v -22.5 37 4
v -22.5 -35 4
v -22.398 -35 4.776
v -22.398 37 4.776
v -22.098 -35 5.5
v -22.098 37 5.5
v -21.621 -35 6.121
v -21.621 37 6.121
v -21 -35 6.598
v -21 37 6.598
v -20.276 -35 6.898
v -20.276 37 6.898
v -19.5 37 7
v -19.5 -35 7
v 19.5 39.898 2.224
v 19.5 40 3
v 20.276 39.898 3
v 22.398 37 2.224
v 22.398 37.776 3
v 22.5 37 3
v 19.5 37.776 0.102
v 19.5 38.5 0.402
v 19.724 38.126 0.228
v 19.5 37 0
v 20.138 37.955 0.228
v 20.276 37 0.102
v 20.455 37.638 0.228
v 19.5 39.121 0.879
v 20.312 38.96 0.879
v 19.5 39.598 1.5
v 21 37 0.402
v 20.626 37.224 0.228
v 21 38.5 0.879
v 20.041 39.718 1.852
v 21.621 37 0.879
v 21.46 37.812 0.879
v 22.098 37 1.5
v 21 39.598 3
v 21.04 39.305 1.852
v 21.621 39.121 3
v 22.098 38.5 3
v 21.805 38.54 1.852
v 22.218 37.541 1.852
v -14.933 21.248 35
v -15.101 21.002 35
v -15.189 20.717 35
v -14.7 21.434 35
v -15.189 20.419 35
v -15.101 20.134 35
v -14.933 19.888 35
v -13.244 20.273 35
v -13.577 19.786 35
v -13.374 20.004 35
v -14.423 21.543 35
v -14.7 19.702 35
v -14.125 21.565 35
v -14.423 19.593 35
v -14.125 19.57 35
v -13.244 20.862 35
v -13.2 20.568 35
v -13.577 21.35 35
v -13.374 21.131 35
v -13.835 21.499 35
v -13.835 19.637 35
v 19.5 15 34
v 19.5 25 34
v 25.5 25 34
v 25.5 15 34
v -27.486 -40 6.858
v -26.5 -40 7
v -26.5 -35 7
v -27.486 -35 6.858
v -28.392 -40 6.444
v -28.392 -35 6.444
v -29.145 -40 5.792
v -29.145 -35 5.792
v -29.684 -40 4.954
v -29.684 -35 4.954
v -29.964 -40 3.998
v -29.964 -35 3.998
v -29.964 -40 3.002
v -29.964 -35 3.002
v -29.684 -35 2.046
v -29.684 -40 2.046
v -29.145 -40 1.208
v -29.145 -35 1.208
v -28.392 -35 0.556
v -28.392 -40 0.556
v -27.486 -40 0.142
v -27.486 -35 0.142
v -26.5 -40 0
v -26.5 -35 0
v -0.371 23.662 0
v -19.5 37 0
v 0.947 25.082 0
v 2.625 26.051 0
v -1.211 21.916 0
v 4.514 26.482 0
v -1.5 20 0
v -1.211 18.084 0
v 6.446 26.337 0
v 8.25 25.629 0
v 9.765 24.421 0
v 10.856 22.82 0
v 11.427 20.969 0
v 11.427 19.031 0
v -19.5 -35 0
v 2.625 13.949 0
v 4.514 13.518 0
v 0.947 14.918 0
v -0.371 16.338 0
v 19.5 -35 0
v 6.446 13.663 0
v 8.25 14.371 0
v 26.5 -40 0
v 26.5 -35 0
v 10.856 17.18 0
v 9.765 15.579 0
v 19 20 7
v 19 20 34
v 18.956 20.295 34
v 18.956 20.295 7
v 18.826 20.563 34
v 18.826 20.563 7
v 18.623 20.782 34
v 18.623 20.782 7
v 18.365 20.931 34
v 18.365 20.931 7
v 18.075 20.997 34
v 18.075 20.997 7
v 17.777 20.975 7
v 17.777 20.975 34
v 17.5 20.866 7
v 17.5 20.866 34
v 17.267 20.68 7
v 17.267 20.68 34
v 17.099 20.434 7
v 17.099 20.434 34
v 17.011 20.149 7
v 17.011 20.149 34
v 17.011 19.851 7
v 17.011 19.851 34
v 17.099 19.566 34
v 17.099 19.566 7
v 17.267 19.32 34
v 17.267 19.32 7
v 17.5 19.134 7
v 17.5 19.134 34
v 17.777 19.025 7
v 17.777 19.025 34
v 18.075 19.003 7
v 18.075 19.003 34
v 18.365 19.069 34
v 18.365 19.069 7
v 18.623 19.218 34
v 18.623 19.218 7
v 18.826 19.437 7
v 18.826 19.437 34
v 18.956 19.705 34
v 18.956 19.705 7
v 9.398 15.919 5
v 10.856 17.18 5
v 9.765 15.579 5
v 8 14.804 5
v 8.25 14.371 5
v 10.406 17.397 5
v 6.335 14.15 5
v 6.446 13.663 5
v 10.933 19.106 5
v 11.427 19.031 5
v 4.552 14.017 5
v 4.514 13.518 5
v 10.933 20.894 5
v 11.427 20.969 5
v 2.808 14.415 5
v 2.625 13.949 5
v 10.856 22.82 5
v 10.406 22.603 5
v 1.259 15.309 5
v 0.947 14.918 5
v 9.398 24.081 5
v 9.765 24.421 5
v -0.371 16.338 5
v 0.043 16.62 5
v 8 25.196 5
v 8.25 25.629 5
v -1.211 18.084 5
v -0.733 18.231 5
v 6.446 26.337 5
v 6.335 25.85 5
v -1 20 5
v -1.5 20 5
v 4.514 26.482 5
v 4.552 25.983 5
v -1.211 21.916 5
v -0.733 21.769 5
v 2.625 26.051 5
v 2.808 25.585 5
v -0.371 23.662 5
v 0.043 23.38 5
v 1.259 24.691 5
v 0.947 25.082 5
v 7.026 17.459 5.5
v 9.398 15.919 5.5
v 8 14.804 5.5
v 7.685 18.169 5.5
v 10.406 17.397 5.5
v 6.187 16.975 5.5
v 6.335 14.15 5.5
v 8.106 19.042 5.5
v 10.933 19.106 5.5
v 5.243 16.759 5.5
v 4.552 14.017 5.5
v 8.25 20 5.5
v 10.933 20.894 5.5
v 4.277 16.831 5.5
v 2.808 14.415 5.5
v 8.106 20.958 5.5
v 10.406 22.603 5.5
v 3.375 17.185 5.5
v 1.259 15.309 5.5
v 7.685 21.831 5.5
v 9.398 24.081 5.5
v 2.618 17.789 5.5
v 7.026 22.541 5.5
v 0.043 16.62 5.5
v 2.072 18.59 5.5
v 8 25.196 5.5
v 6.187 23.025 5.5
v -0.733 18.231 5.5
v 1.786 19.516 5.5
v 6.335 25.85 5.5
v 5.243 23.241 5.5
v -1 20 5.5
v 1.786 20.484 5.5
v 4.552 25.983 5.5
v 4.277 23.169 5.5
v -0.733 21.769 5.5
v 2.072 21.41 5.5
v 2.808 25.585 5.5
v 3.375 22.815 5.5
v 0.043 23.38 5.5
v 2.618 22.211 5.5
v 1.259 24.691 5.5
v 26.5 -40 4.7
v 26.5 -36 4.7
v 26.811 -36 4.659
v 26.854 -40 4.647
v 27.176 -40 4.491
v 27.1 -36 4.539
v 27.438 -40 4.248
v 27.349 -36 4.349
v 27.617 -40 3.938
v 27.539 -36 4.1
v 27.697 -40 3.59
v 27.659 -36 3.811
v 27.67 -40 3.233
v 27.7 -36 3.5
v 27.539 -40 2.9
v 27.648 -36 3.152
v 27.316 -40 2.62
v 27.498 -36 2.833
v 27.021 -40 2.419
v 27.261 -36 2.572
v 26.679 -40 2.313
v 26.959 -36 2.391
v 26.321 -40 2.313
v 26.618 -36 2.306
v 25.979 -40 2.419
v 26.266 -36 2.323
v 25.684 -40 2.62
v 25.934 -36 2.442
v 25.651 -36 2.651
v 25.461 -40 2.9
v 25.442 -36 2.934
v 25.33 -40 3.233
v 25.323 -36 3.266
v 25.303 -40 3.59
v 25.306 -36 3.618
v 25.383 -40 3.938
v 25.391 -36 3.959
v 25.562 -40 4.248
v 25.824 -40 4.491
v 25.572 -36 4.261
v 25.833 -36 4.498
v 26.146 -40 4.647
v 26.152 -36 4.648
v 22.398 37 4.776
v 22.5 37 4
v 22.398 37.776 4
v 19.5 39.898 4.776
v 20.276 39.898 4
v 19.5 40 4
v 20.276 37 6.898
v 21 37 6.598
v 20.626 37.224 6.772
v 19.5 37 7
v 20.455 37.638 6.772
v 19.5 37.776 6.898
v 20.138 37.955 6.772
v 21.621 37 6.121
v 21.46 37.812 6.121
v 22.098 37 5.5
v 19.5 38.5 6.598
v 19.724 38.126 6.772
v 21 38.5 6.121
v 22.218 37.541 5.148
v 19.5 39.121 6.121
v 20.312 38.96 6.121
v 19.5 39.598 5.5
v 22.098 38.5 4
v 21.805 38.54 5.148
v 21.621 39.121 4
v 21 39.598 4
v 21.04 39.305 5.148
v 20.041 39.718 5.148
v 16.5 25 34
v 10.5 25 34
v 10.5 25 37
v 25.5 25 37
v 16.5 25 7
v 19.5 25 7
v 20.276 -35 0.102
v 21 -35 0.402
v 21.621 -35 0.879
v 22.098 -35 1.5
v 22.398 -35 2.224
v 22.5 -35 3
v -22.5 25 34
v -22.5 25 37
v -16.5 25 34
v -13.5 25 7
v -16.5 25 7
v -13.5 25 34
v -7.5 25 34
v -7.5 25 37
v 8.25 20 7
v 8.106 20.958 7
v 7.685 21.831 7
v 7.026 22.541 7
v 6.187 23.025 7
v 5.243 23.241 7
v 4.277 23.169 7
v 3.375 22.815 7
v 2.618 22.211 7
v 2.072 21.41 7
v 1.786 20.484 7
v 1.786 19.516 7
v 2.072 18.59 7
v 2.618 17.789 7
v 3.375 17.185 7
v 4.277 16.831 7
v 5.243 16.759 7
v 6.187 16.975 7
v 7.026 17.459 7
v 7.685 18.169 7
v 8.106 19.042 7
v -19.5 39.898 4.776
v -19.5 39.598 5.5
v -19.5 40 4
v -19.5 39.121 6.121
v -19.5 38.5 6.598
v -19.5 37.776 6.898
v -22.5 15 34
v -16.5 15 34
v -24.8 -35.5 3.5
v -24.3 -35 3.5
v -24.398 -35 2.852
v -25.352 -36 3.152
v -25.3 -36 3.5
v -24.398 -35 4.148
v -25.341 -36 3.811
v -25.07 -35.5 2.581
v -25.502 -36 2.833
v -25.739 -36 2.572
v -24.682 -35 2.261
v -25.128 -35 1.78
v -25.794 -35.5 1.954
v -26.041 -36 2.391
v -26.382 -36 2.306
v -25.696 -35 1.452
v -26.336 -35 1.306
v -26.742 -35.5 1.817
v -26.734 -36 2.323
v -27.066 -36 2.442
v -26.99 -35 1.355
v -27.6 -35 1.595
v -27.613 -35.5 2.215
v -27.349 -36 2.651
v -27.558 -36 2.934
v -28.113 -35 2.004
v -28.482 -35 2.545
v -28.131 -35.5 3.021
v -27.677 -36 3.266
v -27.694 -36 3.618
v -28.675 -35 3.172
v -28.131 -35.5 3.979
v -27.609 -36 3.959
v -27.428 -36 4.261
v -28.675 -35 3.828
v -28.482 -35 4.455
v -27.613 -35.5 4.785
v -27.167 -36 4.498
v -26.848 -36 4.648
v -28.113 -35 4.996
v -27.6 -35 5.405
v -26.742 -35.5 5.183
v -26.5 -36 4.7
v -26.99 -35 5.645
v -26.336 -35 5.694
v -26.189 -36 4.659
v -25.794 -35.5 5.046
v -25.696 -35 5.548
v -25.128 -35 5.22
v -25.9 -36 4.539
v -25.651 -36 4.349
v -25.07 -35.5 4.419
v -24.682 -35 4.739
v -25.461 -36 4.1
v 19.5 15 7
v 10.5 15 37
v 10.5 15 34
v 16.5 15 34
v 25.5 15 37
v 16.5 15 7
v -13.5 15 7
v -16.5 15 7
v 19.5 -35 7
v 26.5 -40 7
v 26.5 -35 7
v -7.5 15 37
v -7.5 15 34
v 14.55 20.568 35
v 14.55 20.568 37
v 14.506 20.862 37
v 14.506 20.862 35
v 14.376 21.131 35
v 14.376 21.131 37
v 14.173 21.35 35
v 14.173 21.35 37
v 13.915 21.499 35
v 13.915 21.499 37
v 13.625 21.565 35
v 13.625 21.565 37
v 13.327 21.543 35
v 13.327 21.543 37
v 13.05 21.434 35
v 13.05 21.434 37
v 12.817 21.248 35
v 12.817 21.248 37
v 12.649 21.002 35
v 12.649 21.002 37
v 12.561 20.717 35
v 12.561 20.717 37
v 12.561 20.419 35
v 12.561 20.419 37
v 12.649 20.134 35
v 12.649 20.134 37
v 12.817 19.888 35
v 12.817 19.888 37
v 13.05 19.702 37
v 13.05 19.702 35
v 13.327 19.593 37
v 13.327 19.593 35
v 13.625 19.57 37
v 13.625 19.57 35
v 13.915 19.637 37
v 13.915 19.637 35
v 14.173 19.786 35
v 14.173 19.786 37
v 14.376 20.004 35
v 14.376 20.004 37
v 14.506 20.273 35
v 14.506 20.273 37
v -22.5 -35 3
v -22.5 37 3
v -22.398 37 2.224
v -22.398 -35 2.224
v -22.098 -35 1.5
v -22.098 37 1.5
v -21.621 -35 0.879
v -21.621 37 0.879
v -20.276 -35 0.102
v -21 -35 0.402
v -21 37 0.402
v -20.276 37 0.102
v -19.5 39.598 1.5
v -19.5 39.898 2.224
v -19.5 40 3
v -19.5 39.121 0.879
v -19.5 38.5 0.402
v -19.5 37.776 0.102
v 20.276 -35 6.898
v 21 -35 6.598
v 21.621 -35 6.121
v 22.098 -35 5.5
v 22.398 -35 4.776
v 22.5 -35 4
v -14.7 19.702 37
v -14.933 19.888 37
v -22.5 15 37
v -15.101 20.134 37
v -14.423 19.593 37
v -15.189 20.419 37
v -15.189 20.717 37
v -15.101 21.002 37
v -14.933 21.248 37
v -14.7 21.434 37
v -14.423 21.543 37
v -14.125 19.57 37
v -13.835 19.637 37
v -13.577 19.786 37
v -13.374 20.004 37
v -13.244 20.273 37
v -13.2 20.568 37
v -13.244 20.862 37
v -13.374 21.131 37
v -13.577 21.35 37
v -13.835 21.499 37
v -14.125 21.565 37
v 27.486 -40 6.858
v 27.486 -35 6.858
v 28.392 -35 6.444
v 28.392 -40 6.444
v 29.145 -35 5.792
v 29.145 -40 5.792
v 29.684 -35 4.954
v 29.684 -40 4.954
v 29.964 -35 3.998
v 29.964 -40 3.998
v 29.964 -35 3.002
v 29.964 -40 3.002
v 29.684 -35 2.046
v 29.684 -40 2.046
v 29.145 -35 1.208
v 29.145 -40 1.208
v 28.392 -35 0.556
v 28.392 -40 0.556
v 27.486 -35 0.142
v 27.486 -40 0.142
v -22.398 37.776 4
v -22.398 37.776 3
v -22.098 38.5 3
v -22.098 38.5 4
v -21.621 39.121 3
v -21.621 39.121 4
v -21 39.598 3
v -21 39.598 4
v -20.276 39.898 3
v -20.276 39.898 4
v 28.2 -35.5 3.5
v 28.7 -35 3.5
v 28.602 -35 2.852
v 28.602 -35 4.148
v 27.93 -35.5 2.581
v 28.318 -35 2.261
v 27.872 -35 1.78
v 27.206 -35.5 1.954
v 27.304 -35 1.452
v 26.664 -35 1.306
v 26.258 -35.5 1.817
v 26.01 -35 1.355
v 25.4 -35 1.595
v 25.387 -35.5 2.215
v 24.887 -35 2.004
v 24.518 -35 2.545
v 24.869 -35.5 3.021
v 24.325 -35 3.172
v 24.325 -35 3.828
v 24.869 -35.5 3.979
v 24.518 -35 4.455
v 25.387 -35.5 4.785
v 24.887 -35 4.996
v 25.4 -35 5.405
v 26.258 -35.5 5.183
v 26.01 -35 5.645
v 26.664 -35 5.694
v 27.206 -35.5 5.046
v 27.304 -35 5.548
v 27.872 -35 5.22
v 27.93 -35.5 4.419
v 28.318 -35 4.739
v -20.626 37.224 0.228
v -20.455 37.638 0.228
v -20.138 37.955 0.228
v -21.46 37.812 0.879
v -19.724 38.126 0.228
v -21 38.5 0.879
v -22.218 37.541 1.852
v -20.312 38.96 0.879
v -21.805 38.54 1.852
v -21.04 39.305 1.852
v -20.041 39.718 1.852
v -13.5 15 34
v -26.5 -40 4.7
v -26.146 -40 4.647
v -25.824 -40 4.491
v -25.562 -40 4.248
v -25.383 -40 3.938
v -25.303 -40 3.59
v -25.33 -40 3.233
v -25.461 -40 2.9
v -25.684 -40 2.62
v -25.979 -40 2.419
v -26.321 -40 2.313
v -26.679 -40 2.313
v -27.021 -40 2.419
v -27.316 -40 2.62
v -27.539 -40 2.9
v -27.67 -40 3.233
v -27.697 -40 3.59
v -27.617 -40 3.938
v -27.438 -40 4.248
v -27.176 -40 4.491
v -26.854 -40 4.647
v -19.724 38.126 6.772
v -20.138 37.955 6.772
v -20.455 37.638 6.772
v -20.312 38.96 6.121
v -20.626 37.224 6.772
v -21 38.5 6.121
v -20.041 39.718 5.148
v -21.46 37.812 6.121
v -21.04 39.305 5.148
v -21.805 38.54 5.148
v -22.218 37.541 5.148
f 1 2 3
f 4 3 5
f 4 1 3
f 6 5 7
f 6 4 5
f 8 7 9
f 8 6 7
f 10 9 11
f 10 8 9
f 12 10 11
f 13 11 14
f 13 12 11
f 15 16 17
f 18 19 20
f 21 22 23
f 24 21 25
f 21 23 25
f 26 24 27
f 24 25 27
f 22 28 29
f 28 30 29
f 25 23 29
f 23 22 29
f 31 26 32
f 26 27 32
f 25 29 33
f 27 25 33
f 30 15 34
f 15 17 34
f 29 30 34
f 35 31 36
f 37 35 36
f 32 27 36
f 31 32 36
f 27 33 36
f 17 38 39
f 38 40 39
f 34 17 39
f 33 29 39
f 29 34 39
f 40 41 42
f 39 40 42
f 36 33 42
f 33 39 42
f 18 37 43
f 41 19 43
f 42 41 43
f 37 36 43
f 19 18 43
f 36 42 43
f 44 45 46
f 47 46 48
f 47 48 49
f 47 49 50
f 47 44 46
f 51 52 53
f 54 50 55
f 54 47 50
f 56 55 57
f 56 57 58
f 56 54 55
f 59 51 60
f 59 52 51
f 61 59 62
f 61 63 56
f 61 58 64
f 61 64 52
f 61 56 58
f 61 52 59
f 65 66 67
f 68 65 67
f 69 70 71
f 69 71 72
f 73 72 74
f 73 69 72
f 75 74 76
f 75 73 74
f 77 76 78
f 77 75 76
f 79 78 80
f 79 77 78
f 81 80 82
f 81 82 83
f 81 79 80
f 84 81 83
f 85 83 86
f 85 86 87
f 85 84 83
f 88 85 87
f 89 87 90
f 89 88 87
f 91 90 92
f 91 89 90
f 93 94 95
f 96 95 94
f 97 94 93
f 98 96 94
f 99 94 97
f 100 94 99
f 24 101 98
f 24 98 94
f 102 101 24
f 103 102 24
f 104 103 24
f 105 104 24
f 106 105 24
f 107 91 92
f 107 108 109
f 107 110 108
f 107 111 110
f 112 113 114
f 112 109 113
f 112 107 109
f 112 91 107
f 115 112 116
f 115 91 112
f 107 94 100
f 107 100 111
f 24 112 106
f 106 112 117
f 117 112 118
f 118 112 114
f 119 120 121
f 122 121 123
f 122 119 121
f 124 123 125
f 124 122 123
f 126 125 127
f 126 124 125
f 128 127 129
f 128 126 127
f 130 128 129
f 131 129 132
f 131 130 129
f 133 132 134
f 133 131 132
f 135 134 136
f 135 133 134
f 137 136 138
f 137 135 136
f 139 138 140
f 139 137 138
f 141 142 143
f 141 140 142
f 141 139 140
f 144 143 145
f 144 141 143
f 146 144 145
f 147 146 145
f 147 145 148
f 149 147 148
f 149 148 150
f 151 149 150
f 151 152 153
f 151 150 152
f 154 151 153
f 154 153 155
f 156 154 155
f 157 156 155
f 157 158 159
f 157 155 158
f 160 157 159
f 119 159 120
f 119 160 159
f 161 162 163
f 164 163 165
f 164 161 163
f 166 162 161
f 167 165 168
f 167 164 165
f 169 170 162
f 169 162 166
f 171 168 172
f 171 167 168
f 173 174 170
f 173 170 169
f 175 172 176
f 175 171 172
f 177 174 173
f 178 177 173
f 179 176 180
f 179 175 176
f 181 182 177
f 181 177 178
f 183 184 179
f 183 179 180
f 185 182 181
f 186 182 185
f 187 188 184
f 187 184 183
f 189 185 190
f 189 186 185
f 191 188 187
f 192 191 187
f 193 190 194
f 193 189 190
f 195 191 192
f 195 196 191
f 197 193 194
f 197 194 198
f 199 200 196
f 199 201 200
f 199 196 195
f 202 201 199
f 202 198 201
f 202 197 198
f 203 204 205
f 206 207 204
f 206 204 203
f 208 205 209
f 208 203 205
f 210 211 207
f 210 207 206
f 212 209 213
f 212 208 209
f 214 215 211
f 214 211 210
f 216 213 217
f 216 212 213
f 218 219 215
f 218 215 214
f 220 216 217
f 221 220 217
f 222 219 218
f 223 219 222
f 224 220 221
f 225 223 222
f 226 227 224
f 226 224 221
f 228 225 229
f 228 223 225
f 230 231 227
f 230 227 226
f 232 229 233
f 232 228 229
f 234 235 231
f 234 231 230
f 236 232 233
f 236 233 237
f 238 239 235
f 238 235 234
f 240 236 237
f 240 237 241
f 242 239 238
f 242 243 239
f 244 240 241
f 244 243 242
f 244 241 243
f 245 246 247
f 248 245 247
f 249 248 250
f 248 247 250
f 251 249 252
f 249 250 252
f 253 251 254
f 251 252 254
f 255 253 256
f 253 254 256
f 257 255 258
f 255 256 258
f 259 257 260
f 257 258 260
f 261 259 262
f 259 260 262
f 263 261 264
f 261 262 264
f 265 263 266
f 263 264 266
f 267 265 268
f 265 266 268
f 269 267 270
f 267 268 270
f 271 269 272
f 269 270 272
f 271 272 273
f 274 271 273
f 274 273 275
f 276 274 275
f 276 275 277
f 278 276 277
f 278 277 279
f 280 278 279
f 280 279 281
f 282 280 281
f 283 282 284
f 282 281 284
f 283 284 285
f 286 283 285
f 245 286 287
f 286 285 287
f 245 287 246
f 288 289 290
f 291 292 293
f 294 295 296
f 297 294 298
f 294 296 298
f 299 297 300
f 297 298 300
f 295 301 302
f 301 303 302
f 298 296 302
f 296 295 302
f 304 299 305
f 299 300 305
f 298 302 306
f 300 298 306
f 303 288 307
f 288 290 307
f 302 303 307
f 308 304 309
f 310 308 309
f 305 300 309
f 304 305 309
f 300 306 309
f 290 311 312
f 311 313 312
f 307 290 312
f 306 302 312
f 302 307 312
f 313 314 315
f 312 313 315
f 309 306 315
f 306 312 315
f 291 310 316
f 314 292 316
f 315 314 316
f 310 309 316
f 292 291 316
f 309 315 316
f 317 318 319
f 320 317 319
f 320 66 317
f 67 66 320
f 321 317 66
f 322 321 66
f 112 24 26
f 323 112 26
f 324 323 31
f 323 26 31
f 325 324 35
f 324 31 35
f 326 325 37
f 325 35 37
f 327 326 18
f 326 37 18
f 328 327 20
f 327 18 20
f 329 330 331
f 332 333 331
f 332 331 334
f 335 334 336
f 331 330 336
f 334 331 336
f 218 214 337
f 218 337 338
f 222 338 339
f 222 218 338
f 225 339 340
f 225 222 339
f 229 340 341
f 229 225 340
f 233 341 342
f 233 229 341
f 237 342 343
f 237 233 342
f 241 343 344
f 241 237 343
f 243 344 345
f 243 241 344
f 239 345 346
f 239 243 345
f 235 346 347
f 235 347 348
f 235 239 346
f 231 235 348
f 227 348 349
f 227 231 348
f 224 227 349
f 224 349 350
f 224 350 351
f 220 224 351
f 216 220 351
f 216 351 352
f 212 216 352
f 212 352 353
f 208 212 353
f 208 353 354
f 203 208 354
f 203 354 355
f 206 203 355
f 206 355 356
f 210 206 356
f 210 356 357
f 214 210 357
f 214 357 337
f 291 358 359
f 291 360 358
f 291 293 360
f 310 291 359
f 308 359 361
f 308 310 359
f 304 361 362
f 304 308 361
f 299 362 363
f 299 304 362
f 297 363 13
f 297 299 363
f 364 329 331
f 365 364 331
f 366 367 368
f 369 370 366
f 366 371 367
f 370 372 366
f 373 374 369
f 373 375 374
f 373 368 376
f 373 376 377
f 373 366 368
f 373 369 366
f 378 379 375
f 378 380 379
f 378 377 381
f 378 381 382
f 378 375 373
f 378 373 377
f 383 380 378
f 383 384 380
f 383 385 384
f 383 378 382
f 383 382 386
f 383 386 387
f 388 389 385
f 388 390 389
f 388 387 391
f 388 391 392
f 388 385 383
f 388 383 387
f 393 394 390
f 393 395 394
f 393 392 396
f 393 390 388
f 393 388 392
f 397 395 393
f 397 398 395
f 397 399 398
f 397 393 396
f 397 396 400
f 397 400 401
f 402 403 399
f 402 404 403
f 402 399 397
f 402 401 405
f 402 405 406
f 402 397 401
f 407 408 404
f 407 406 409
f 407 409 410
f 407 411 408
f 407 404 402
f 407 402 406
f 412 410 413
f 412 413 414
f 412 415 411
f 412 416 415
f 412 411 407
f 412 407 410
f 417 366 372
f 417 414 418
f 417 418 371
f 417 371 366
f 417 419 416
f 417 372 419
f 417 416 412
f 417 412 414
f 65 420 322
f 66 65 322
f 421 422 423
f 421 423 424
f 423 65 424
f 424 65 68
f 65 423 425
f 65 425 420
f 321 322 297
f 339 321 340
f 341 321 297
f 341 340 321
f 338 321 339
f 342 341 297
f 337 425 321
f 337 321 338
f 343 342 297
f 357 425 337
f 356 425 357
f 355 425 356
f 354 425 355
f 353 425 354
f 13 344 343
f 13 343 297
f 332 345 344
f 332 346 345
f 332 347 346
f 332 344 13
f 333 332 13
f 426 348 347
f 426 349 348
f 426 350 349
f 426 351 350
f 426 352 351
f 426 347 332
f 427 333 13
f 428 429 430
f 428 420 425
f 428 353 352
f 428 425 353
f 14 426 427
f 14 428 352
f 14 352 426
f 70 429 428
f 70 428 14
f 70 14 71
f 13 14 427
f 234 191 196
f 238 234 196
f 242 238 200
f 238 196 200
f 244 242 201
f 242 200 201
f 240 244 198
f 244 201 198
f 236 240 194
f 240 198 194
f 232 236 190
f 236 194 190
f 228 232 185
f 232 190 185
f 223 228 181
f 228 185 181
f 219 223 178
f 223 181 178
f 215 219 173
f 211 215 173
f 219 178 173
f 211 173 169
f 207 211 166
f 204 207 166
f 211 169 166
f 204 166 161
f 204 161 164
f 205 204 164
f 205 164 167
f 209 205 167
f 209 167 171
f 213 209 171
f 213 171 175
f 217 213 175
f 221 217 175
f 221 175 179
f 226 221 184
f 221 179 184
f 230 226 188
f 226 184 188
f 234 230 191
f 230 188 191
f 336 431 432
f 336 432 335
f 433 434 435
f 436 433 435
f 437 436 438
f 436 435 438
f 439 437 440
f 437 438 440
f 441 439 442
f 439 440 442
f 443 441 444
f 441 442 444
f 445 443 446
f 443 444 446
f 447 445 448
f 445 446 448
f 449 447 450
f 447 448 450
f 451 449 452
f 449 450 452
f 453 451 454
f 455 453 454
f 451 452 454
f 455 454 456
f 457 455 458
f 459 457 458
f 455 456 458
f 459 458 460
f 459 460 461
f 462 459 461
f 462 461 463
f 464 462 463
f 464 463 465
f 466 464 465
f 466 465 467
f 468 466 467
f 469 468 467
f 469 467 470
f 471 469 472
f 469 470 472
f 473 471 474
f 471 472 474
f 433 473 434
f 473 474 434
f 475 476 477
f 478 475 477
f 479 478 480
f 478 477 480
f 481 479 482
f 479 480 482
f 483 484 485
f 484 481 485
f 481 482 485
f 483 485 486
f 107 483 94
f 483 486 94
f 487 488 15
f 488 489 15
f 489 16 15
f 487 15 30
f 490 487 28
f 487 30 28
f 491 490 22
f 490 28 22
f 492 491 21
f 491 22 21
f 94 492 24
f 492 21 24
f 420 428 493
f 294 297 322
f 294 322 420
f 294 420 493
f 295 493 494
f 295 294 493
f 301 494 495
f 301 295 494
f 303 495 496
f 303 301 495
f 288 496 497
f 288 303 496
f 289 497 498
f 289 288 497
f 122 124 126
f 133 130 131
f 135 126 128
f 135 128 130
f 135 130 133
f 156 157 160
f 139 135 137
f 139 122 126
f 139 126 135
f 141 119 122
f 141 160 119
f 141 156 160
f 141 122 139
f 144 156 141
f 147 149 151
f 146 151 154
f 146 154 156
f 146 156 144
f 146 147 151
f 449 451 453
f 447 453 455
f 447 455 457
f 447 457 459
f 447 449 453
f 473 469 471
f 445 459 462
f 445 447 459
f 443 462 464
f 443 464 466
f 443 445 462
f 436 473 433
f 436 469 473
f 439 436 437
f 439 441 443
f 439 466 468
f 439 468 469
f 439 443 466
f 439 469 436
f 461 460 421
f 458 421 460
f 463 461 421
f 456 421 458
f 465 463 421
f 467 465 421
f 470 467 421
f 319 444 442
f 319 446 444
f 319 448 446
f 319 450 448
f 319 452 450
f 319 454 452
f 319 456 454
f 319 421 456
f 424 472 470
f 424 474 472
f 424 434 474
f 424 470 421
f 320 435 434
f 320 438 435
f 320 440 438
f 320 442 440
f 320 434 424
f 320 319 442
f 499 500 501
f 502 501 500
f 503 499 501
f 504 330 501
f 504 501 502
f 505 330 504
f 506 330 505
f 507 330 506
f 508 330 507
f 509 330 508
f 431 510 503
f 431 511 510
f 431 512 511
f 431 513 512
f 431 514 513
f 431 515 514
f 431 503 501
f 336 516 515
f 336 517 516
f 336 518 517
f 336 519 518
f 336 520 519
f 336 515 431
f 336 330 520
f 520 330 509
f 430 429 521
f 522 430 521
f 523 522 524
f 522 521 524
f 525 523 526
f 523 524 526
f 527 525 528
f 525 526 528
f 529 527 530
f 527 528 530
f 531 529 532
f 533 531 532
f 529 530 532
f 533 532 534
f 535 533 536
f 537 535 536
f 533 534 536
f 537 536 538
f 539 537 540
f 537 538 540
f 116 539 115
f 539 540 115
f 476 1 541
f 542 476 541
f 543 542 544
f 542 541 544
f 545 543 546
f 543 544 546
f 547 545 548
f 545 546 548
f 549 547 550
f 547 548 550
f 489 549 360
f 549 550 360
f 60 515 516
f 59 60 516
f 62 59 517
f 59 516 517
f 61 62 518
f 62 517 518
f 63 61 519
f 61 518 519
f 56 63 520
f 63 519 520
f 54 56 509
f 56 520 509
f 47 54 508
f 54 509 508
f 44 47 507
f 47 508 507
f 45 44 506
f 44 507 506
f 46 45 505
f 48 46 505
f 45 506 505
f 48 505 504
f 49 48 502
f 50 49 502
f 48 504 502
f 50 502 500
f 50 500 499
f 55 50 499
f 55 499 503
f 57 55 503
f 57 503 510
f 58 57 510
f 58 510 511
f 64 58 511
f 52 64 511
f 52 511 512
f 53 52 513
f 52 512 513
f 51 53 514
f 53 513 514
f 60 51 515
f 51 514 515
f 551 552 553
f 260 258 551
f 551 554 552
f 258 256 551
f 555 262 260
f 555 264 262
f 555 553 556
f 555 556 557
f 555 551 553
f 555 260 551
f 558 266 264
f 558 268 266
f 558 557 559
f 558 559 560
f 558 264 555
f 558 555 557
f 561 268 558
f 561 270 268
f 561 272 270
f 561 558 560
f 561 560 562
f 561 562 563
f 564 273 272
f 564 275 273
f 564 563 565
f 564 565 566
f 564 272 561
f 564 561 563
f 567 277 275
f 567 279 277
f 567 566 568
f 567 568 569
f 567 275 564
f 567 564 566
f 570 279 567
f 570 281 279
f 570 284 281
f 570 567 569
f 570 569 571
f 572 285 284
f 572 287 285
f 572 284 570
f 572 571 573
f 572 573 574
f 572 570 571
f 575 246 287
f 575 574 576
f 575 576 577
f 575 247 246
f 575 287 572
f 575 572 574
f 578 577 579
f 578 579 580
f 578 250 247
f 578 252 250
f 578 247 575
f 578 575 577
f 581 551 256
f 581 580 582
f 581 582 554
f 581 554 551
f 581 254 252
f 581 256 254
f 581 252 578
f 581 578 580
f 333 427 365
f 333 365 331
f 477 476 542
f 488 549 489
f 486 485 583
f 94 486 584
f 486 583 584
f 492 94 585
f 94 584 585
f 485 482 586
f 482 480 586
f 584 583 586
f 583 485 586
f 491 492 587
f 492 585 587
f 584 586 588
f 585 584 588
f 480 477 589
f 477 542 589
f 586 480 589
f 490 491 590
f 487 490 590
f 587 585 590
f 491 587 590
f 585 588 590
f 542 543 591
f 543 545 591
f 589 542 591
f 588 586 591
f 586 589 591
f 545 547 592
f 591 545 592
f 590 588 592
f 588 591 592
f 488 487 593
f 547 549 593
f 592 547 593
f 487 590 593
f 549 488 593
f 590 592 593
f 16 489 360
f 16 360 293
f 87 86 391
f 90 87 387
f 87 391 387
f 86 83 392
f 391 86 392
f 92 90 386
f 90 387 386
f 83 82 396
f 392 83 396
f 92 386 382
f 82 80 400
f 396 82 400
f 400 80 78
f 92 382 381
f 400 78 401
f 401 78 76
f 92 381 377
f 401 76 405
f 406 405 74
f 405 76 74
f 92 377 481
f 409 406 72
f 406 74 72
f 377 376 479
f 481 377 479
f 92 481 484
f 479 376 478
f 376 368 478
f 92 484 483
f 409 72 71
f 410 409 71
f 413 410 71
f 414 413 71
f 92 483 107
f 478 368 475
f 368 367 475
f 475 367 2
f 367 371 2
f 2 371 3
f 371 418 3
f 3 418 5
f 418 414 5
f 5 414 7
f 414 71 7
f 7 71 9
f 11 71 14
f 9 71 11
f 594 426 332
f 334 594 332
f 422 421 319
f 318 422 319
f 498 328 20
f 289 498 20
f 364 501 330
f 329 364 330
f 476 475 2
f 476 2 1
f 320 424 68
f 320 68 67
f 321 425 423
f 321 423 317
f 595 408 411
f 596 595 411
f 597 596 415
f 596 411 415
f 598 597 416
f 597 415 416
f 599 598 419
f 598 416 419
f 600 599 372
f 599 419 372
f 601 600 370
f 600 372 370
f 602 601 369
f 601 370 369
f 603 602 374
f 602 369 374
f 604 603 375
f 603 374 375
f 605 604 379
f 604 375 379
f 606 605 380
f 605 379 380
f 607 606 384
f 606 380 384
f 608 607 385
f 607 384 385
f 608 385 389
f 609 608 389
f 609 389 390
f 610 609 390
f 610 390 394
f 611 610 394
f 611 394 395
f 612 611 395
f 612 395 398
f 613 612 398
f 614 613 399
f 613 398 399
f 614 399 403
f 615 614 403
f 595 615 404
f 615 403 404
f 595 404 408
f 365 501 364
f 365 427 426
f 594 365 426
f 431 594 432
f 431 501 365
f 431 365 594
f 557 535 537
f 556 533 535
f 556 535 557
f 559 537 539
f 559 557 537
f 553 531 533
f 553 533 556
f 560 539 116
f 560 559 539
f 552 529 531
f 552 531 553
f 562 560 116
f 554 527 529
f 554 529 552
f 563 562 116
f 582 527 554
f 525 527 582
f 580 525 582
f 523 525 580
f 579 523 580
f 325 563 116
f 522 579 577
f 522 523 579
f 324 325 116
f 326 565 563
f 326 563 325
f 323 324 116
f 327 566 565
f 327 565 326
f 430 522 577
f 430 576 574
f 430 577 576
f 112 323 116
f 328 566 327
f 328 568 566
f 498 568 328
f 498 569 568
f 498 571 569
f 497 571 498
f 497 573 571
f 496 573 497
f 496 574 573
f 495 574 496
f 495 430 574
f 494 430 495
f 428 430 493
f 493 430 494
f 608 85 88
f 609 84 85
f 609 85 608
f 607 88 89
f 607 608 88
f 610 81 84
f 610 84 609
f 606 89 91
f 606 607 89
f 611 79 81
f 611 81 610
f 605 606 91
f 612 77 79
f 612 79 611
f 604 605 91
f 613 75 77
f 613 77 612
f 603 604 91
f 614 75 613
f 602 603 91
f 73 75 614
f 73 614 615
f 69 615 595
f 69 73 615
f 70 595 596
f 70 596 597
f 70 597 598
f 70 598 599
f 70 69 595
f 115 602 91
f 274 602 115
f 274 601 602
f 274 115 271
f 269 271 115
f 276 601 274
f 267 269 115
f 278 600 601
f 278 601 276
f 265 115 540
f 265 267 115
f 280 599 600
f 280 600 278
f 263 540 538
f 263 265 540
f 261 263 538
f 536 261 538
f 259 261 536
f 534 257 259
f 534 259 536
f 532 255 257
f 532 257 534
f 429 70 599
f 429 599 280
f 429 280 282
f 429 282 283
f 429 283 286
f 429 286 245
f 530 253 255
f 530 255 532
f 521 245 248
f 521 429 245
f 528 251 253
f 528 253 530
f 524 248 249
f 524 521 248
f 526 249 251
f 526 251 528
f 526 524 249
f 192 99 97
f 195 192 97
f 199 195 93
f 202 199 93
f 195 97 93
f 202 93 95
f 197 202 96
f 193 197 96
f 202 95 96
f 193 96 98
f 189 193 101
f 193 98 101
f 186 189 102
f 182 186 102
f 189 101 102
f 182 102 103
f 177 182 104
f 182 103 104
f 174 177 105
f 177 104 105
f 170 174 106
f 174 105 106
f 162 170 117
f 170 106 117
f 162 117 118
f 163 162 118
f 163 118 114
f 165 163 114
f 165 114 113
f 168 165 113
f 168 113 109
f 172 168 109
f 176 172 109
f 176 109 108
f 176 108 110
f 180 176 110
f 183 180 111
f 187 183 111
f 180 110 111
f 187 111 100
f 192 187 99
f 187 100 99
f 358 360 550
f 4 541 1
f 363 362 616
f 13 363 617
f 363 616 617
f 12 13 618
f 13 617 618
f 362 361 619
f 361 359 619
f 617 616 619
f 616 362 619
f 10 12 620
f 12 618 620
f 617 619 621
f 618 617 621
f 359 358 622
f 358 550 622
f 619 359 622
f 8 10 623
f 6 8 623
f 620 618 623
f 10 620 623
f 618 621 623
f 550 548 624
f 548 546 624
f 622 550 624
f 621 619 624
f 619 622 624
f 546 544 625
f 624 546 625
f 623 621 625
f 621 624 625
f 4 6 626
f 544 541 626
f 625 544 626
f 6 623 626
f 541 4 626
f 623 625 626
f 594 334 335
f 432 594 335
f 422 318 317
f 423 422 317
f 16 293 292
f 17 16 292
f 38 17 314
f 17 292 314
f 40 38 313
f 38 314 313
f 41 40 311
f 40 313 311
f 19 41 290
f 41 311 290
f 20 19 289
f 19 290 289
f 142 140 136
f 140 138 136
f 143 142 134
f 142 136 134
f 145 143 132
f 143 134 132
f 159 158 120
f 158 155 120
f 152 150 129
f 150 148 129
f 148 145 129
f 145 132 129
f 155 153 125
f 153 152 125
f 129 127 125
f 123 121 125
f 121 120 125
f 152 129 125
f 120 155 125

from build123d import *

# Parameters (mm, degrees)
CROQUIS1_W                   = 45
CROQUIS1_H                   = 80
CROQUIS1_R                   = 3.25
SALIENTE_EXTRUIR1_DEPTH      = 7
CROQUIS2_R                   = 6.5
CORTAR_EXTRUIR1_DEPTH        = 5
CROQUIS3_R                   = 6
CORTAR_EXTRUIR2_DEPTH        = 0.5
REDONDEO2_R                  = 3
SALIENTE_EXTRUIR2_DEPTH      = 5
TALADROAVANZADO1_OUTLINE_R   = 1.2
TALADROAVANZADO1_DEPTH       = 1
TALADROAVANZADO1_DRAFT       = -45
TALADROAVANZADO1_2_OUTLINE_R = 1.2
TALADROAVANZADO1_2_DEPTH     = 1
TALADROAVANZADO1_2_DRAFT     = -45
CROQUIS8_R                   = 1.2
CORTAR_EXTRUIR3_DEPTH        = 83.006097334
CROQUIS9_W                   = 3
CROQUIS9_H                   = 10
CROQUIS9_R                   = 1
SALIENTE_EXTRUIR3_DEPTH      = 30
CROQUIS10_W                  = 15
CROQUIS10_H                  = 10
SALIENTE_EXTRUIR4_DEPTH      = 3
CROQUIS11_R                  = 1
CORTAR_EXTRUIR5_DEPTH        = 2


# Read off the part's stored shape, not the designer's step: TaladroAvanzado1
with BuildPart() as part:
    # Croquis1 → Saliente-Extruir1 (new body)
    with BuildSketch(Plane.XY):
        Rectangle(CROQUIS1_W, CROQUIS1_H)
        with Locations((5, 20)):
            Circle(CROQUIS1_R, mode=Mode.SUBTRACT)
    extrude(amount=SALIENTE_EXTRUIR1_DEPTH)

    # Croquis2 → Cortar-Extruir1 (cut)
    with BuildSketch(Plane(origin=(0, 0, 0), x_dir=(-1, 0, 0), z_dir=(0, 0, -1))):
        with Locations((-5, 20)):
            Circle(CROQUIS2_R)
    extrude(amount=-CORTAR_EXTRUIR1_DEPTH, mode=Mode.SUBTRACT)

    # Croquis3 → Cortar-Extruir2 (cut)
    with BuildSketch(Plane(origin=(0, 0, 5), x_dir=(-1, 0, 0), z_dir=(0, 0, -1))):
        with Locations((-5, 20)):
            Circle(CROQUIS3_R)
    extrude(amount=-CORTAR_EXTRUIR2_DEPTH, mode=Mode.SUBTRACT)

    # Redondeo2
    redondeo2_edges = [part.edges().sort_by_distance(p)[0] for p in [
        (-22.5, 40, 3.5),
        (22.5, 40, 3.5),
        (22.5, 0, 7),
        (0, 40, 7),
        (-22.5, 0, 7),
        (-22.5, 0, 0),
        (0, 40, 0),
        (22.5, 0, 0),
    ]]
    fillet(redondeo2_edges, radius=REDONDEO2_R)

    # Croquis4 → Saliente-Extruir2 (add)
    with BuildSketch(Plane.XZ.offset(40)):
        with BuildLine():
            Line((-19.5, 7), (-26.5, 7))
            ThreePointArc((-26.5, 7), (-30, 3.5), (-26.5, 0))
            Line((-26.5, 0), (-19.5, 0))
            Line((-19.5, 0), (-19.5, 7))
        make_face()
        with BuildLine():
            Line((19.5, 7), (26.5, 7))
            ThreePointArc((26.5, 7), (30, 3.5), (26.5, 0))
            Line((26.5, 0), (19.5, 0))
            Line((19.5, 0), (19.5, 7))
        make_face()
    extrude(amount=-SALIENTE_EXTRUIR2_DEPTH)


with BuildPart() as taladroavanzado1_tool:
    # TaladroAvanzado1 outline → TaladroAvanzado1 (with draft: the straight prism first)
    with BuildSketch(Plane(origin=(0, -36, 0), x_dir=(1, 0, 0), z_dir=(0, 1, 0))):
        with Locations((26.5, -3.5)):
            Circle(TALADROAVANZADO1_OUTLINE_R)
    extrude(amount=TALADROAVANZADO1_DEPTH)
    # TaladroAvanzado1: the draft: its side faces are tilted about the plane it starts from
    taladroavanzado1_sides = [taladroavanzado1_tool.faces().sort_by_distance(p)[0] for p in [
        (25.3, -35.5, 3.5),
    ]]
    draft(taladroavanzado1_sides, Plane(origin=(0, -36, 0), x_dir=(1, 0, 0), z_dir=(0, 1, 0)), TALADROAVANZADO1_DRAFT)


with BuildPart() as part_1:
    add(part.part)

    # TaladroAvanzado1: cut by taladroavanzado1_tool
    add(taladroavanzado1_tool.part, mode=Mode.SUBTRACT)


with BuildPart() as taladroavanzado1_2_tool:
    # TaladroAvanzado1 2 outline → TaladroAvanzado1 2 (with draft: the straight prism first)
    with BuildSketch(Plane(origin=(0, -36, 0), x_dir=(1, 0, 0), z_dir=(0, 1, 0))):
        with Locations((-26.5, -3.5)):
            Circle(TALADROAVANZADO1_2_OUTLINE_R)
    extrude(amount=TALADROAVANZADO1_2_DEPTH)
    # TaladroAvanzado1 2: the draft: its side faces are tilted about the plane it starts from
    taladroavanzado1_2_sides = [taladroavanzado1_2_tool.faces().sort_by_distance(p)[0] for p in [
        (-27.7, -35.5, 3.5),
    ]]
    draft(taladroavanzado1_2_sides, Plane(origin=(0, -36, 0), x_dir=(1, 0, 0), z_dir=(0, 1, 0)), TALADROAVANZADO1_2_DRAFT)


with BuildPart() as part_2:
    add(part_1.part)

    # TaladroAvanzado1 2: cut by taladroavanzado1_2_tool
    add(taladroavanzado1_2_tool.part, mode=Mode.SUBTRACT)

    # Croquis8 → Cortar-Extruir3 (cut, through all)
    with BuildSketch(Plane(origin=(0, -36, 0), x_dir=(1, 0, 0), z_dir=(0, 1, 0))):
        with Locations(Location((26.5, -3.5, 0), (0, 0, 270))):
            Circle(CROQUIS8_R)
        with Locations(Location((-26.5, -3.5, 0), (0, 0, 270))):
            Circle(CROQUIS8_R)
    extrude(amount=-CORTAR_EXTRUIR3_DEPTH, mode=Mode.SUBTRACT)

    # Croquis9 → Saliente-Extruir3 (add)
    # profile 1 of 2: a face of its own
    with BuildSketch(Plane.XY.offset(7)):
        with Locations((-15, 20)):
            Rectangle(CROQUIS9_W, CROQUIS9_H)
    # profile 2 of 2: a face of its own
    with BuildSketch(Plane.XY.offset(7)):
        with Locations((18, 20)):
            Rectangle(CROQUIS9_W, CROQUIS9_H)
        with Locations((18, 20)):
            Circle(CROQUIS9_R, mode=Mode.SUBTRACT)
    extrude(amount=SALIENTE_EXTRUIR3_DEPTH)

    # Croquis10 → Saliente-Extruir4 (add)
    with BuildSketch(Plane.XY.offset(37)):
        with Locations((-15, 20)):
            Rectangle(CROQUIS10_W, CROQUIS10_H)
        with Locations((18, 20)):
            Rectangle(CROQUIS10_W, CROQUIS10_H)
    extrude(amount=-SALIENTE_EXTRUIR4_DEPTH)

    # Croquis11 → Cortar-Extruir5 (cut)
    with BuildSketch(Plane.XY.offset(37)):
        with Locations((-14.2, 20.567687828)):
            Circle(CROQUIS11_R)
        with Locations((13.55, 20.567687828)):
            Circle(CROQUIS11_R)
    extrude(amount=-CORTAR_EXTRUIR5_DEPTH, mode=Mode.SUBTRACT)


solid = part_2.part
